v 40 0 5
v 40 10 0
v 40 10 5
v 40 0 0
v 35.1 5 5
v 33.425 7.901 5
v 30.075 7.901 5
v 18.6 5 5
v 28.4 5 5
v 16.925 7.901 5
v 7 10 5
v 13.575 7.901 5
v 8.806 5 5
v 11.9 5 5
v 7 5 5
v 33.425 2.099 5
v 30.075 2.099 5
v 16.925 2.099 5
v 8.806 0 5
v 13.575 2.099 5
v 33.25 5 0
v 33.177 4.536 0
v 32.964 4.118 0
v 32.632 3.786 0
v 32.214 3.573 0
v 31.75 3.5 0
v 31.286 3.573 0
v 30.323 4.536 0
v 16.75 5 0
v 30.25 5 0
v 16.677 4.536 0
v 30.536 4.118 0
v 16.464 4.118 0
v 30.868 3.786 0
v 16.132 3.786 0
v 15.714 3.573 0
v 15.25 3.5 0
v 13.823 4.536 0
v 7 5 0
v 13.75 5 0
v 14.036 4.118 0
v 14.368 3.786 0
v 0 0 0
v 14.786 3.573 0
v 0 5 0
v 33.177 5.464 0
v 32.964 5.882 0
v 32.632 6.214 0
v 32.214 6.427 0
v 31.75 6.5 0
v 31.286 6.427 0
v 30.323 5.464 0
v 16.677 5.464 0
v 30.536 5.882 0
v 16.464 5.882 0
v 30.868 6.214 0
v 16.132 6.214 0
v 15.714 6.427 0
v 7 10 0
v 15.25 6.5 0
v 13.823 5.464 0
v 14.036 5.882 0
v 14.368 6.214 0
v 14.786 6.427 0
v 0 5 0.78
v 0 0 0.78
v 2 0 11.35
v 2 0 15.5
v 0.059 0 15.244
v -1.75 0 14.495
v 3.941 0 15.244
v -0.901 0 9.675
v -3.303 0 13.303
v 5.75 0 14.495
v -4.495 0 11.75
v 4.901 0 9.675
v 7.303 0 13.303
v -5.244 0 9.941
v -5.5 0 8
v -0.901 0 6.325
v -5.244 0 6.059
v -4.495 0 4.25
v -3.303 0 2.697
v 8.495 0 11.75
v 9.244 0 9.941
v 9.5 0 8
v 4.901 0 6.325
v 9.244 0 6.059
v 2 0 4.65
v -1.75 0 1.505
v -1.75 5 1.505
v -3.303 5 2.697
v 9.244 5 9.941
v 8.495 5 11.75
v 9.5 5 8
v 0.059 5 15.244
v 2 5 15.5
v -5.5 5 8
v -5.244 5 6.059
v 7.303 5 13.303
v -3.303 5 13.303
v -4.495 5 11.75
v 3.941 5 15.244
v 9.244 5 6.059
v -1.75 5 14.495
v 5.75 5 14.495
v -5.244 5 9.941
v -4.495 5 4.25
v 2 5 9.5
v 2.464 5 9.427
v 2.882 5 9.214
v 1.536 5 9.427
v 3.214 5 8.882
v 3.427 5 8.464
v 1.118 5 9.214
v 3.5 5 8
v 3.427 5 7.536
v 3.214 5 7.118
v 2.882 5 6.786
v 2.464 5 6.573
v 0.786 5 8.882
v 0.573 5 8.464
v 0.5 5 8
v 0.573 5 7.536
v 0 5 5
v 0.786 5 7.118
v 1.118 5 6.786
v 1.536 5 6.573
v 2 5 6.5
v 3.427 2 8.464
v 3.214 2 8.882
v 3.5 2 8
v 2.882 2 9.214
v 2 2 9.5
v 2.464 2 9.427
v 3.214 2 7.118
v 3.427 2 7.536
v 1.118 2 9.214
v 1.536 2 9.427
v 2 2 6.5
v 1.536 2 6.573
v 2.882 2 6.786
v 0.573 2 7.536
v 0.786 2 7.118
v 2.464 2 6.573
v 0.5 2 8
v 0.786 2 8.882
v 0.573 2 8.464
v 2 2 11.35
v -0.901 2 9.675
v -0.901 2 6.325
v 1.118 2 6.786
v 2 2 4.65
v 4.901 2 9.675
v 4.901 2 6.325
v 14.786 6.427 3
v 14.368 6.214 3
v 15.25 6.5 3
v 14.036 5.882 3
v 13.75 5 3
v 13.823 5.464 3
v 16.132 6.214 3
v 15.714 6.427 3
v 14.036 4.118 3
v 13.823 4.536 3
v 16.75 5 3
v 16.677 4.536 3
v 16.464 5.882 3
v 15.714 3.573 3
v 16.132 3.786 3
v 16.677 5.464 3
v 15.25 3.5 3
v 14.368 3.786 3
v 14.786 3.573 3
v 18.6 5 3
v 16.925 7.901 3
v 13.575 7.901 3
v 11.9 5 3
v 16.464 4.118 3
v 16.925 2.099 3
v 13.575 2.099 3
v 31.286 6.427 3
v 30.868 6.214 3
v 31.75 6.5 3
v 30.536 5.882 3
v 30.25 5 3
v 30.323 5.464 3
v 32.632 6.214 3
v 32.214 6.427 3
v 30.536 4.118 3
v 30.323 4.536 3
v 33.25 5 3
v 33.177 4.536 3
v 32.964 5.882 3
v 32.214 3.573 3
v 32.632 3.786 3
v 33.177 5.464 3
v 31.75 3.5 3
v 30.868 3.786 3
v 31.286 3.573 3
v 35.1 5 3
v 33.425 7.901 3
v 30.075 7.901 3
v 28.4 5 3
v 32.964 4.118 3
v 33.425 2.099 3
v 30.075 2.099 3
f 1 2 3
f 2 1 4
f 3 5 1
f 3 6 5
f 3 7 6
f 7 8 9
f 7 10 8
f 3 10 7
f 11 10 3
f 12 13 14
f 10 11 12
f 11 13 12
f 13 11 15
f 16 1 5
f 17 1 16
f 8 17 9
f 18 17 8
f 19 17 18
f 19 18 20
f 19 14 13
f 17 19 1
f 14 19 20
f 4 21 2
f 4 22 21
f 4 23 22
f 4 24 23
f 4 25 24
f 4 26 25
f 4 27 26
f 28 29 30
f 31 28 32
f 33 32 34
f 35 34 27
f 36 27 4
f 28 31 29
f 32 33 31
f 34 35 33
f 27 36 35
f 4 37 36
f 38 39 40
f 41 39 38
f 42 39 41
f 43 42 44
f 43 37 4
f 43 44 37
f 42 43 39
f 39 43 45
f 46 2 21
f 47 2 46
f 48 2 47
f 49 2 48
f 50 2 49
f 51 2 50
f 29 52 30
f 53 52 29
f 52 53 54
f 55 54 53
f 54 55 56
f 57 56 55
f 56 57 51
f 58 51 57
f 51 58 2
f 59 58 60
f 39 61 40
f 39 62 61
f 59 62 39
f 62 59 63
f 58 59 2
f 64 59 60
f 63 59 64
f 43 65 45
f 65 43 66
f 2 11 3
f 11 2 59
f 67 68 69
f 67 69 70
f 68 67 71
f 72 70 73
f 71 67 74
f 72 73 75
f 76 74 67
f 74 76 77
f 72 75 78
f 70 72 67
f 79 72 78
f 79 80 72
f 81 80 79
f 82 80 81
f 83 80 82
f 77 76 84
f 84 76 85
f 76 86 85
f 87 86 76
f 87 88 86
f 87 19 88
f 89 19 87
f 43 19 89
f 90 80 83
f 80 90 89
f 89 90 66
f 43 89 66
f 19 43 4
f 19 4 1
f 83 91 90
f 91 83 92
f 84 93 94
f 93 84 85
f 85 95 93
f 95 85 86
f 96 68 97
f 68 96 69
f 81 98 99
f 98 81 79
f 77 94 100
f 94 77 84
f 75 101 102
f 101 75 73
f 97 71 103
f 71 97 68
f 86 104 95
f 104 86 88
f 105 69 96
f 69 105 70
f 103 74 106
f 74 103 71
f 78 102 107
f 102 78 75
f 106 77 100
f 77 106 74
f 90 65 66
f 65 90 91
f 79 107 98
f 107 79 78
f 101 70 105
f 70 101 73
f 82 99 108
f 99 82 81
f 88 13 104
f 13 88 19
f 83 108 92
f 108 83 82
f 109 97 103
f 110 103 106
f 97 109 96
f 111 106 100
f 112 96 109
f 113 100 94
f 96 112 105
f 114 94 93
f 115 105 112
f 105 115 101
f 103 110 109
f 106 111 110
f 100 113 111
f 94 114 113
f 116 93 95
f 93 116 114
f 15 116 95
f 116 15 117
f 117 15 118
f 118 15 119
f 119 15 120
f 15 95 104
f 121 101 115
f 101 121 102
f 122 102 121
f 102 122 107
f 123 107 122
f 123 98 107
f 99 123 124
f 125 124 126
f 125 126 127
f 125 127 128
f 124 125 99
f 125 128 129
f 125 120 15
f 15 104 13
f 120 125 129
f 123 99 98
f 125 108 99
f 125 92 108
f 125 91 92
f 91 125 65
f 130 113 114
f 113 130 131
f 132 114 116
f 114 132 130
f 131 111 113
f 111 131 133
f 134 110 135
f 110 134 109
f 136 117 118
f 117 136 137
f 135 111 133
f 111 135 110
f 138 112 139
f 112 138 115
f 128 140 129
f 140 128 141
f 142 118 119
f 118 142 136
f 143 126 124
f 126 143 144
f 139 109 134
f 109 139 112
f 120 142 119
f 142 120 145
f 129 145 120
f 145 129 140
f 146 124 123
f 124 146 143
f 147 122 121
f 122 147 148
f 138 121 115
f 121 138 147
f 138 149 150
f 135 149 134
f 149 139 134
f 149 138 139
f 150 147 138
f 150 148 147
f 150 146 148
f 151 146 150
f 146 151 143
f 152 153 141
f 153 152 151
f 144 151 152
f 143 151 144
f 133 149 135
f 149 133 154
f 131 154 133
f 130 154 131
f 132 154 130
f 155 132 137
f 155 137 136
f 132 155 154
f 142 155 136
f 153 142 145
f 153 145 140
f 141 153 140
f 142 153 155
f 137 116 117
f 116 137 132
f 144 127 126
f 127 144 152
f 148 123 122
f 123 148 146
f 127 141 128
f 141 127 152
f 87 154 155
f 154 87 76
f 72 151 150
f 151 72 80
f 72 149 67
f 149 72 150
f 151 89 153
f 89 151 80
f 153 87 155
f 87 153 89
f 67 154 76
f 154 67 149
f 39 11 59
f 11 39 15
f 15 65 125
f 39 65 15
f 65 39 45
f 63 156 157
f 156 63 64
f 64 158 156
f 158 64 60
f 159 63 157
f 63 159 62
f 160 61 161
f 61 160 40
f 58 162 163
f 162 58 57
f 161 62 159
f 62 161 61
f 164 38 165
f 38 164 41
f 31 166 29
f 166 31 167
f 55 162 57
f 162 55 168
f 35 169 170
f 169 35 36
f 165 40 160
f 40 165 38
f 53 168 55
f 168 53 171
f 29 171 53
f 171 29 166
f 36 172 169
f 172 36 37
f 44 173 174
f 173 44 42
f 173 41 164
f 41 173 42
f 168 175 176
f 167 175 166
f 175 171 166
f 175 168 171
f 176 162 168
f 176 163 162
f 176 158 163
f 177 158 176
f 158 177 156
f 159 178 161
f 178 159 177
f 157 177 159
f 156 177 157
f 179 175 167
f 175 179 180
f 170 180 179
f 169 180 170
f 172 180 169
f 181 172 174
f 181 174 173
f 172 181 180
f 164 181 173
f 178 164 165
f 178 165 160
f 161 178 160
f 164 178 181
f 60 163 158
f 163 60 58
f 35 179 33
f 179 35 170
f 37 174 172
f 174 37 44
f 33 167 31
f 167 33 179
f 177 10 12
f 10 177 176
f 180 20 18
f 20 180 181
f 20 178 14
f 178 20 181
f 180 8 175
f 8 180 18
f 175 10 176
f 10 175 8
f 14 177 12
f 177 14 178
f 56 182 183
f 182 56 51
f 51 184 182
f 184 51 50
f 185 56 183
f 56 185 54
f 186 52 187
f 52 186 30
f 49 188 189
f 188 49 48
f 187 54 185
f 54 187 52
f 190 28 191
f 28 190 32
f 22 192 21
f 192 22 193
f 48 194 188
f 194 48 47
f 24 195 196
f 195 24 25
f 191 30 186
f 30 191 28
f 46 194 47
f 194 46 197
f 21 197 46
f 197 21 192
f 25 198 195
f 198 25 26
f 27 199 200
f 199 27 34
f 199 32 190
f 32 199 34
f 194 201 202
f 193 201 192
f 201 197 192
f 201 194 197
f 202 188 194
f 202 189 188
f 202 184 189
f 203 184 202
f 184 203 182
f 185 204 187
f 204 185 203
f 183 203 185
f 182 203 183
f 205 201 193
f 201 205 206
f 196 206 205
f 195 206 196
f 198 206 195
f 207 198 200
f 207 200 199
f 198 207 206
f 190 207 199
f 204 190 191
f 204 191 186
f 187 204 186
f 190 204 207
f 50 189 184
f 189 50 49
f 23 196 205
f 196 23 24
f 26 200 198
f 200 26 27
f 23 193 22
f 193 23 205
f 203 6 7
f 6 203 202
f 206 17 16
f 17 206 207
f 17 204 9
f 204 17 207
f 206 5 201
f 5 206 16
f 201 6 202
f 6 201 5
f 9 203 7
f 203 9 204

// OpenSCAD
// file: common.scad
//GLOBAL VALUES


ear_outer=32; // Outer diameter of each ear
ear_inner=5; // hole for each ear M5

mounting_gap = 6.9; // gap between two ears to mount the light



ear_thick=8;

stacked_len = ear_thick*3;
screw_mount_space = 20;
screw_mount_offset =7;
total_len = stacked_len + screw_mount_space*2;
mounting_diff = 8;

//M3 fastener values

m3_nut_trap_d = 6.7;
m3_nut_thick= 2.4;

m3_bolt_head_d = 5.6;
m3_bolt_thick = 3;

//M5 fastener values

m5_nut_thick = 4;
m5_locknut_thick = 5;
nut_trap_d = 9.7;
bolt_head_d = 8.6;



module bolt_nut(hole_len, bolt_d, flip=false){
    /*
        Create a model for a hole with bolt end on one end and nut hole on the other end.
    Note, this functions doesn't subtract the model it only makes the model
    */
    // currently only implemented for 3mm
    if (flip){
        hole_w_end(hole_len, m3_nut_thick, "hex", bolt_d);
        translate([0,0, hole_len]){
            rotate([180, 0, 0]){
                hole_w_end(hole_len, m3_bolt_thick, "round", bolt_d);
            }
        }
    } else {
        hole_w_end(hole_len, m3_bolt_thick, "round", bolt_d);
        translate([0,0, hole_len]){
            rotate([180, 0, 0]){
                hole_w_end(hole_len, m3_nut_thick, "hex", bolt_d);
            }
        }
    }
}

// More generic functions replacing m5_ hole-making functions
module hole_w_end(hole_len, trap_height, type, bolt_d, flip=false){
    /*
       bolt_d - bolt diameter, i.e. 3, 5 mm
        type -- type of the head hole: 'none', 'hex', 'round
    */
    if (type != "none"){
        cylinder(h=hole_len-trap_height, d=bolt_d, $fn=20);
        if (flip){
            m_recess(trap_height, type, bolt_d);
            translate([0,0,trap_height])
                cylinder(h=hole_len-trap_height, d=bolt_d, $fn=20);

        } else {
                translate([0,0, hole_len - trap_height])
                    m_recess(trap_height, type, bolt_d);
        }
    } else {
        cylinder(h=hole_len, d=bolt_d);
    }
}

module m_recess(height, end_type, bolt_d) {
    // nut/bolt capture hole
    /*
       bolt_d - bolt diameter, i.e. 3, 5 mm
        type -- type of the head hole: 'none', 'hex', 'round
    */
    if (bolt_d >= 3 && bolt_d <= 4){
        //M3
        make_recess(height, end_type, m3_nut_trap_d);
    } else if (bolt_d >= 5 && bolt_d <= 6){
        // M5
        make_recess(height, end_type, nut_trap_d);
    }

}

module make_recess(height, end_type, trap_d){
    rotate([0, 0,90]){
        if (end_type == "hex"){
            cylinder(h=height, d=trap_d, $fn=6);
        } else if (end_type == "round"){
            cylinder(h=height, d=trap_d, $fn=20);
        }
    }
}


//Functions specific to M5 size,
// TODO rewrite as hole_w_end m_recess
module m5_recess(height, end_type) {
    // nut/bolt capture hole
    rotate([0, 0,90]){
        if (end_type == "hex"){
            cylinder(h=height, d=nut_trap_d, $fn=6);
        } else if (end_type == "round"){
            cylinder(h=height, d=nut_trap_d, $fn=20);
        }
    }
}



module m5_hole_w_end(hole_len, trap_height, type){
    //Given hole lenght and trap height create a nut trap hole
    if (type != "none"){
        cylinder(h=hole_len-trap_height, d=5.3, $fn=20); // M5 hole;
            translate([0,0, hole_len-trap_height])
                m5_recess(trap_height, type);
    } else {
        cylinder(h=hole_len, d=5.3); // M5 hole;
    }
}
module m5_hole_w_ends(hole_len, nut_extra=0){
    m5_hole_w_end(hole_len, m5_nut_thick, "round");
    rotate([0, 180, 0])
        translate([0, 0, - hole_len])
            m5_hole_w_end(hole_len, m5_nut_thick + nut_extra, "hex");

}
module set_mounting_hole(x_offset, y_offset, thickness, nut_height, end_type, flip=false){
    /*
    end_type -- end types: - hex, round, none
    */
    translate([x_offset, y_offset, 0]){
        hole_w_end(thickness, nut_height, end_type, 5.3, flip);
    }
}



module mounting_holes_2(fastener_len, nut_height, end_type){
    width_offsetn = 16;
    set_mounting_hole(
        screw_mount_offset,
        width_offset + mounting_diff,
        fastener_len,
        nut_height,
        end_type);

    set_mounting_hole(
        total_len - screw_mount_offset,
        width_offset + mounting_diff,
        fastener_len,
        nut_height,
        end_type);


 }

module mounting_holes(fastener_len, nut_height, end_type, flip=false){
    width_offset = 16;
    // Side towards the beginning
    set_mounting_hole(
        screw_mount_offset,
        width_offset + mounting_diff,
        fastener_len,
        nut_height,
        end_type,
        flip);

    set_mounting_hole(
        screw_mount_offset,
        width_offset - mounting_diff,
        fastener_len,
        nut_height,
        end_type,
        flip);

    // Side towards the end
    set_mounting_hole(
        total_len - screw_mount_offset,
        width_offset + mounting_diff,
        fastener_len,
        nut_height,
        end_type,
        flip);

    set_mounting_hole(
        total_len - screw_mount_offset,
        width_offset - mounting_diff,
        fastener_len,
        nut_height,
        end_type,
        flip);
}
// main file
include <common.scad>

thickness = 5;
hinge_d = 15;
cut_cube_len = 7;

side = thickness*2;
length = 40;

wheel_x_offset = 2;
wheel_z_offset = 8;

space_between_mounts = (length - cut_cube_len)/4;
echo("Space between", space_between_mounts);

module hinge_shape(hole_type){
    difference(){
        union(){
            cube([length, side, thickness]);
            //cube([side, thickness, thickness+2]);
            translate([wheel_x_offset,thickness, wheel_z_offset]){
                rotate([90,0,0]){
                        cylinder(h=thickness, d=hinge_d); 
                }
            }
        }
        // Create hole in the wheel
        translate([wheel_x_offset,thickness, wheel_z_offset])
            rotate([90,0,0])
                hole_w_end(thickness, 2 , hole_type, bolt_d=3);
       translate([0, thickness, 0])
            cube([cut_cube_len,thickness, thickness]);
    }
}

module mount_hole(x_offset, y_offset, bolt_shape){
    // given offsets, and bolt shape, create M3 mount holes for this hinge object
    
        translate([x_offset, y_offset, 0])
            rotate([0, 0, 90])
                hole_w_end(thickness, 2, bolt_shape, bolt_d=3);
    
}


module simple_hinge(hole_type, mounting_shape){
    // Create a simple hinge with given hole shape in the hinge
    difference(){
        difference(){
            hinge_shape(hole_type);
            
            //first mount hole
            mount_hole(
                cut_cube_len + space_between_mounts, side/2, mounting_shape);
            
            // Second mount hole
            mount_hole(
                cut_cube_len+ space_between_mounts*3, side/2, mounting_shape);
        }
    
    }
}
simple_hinge("hex", "hex");
